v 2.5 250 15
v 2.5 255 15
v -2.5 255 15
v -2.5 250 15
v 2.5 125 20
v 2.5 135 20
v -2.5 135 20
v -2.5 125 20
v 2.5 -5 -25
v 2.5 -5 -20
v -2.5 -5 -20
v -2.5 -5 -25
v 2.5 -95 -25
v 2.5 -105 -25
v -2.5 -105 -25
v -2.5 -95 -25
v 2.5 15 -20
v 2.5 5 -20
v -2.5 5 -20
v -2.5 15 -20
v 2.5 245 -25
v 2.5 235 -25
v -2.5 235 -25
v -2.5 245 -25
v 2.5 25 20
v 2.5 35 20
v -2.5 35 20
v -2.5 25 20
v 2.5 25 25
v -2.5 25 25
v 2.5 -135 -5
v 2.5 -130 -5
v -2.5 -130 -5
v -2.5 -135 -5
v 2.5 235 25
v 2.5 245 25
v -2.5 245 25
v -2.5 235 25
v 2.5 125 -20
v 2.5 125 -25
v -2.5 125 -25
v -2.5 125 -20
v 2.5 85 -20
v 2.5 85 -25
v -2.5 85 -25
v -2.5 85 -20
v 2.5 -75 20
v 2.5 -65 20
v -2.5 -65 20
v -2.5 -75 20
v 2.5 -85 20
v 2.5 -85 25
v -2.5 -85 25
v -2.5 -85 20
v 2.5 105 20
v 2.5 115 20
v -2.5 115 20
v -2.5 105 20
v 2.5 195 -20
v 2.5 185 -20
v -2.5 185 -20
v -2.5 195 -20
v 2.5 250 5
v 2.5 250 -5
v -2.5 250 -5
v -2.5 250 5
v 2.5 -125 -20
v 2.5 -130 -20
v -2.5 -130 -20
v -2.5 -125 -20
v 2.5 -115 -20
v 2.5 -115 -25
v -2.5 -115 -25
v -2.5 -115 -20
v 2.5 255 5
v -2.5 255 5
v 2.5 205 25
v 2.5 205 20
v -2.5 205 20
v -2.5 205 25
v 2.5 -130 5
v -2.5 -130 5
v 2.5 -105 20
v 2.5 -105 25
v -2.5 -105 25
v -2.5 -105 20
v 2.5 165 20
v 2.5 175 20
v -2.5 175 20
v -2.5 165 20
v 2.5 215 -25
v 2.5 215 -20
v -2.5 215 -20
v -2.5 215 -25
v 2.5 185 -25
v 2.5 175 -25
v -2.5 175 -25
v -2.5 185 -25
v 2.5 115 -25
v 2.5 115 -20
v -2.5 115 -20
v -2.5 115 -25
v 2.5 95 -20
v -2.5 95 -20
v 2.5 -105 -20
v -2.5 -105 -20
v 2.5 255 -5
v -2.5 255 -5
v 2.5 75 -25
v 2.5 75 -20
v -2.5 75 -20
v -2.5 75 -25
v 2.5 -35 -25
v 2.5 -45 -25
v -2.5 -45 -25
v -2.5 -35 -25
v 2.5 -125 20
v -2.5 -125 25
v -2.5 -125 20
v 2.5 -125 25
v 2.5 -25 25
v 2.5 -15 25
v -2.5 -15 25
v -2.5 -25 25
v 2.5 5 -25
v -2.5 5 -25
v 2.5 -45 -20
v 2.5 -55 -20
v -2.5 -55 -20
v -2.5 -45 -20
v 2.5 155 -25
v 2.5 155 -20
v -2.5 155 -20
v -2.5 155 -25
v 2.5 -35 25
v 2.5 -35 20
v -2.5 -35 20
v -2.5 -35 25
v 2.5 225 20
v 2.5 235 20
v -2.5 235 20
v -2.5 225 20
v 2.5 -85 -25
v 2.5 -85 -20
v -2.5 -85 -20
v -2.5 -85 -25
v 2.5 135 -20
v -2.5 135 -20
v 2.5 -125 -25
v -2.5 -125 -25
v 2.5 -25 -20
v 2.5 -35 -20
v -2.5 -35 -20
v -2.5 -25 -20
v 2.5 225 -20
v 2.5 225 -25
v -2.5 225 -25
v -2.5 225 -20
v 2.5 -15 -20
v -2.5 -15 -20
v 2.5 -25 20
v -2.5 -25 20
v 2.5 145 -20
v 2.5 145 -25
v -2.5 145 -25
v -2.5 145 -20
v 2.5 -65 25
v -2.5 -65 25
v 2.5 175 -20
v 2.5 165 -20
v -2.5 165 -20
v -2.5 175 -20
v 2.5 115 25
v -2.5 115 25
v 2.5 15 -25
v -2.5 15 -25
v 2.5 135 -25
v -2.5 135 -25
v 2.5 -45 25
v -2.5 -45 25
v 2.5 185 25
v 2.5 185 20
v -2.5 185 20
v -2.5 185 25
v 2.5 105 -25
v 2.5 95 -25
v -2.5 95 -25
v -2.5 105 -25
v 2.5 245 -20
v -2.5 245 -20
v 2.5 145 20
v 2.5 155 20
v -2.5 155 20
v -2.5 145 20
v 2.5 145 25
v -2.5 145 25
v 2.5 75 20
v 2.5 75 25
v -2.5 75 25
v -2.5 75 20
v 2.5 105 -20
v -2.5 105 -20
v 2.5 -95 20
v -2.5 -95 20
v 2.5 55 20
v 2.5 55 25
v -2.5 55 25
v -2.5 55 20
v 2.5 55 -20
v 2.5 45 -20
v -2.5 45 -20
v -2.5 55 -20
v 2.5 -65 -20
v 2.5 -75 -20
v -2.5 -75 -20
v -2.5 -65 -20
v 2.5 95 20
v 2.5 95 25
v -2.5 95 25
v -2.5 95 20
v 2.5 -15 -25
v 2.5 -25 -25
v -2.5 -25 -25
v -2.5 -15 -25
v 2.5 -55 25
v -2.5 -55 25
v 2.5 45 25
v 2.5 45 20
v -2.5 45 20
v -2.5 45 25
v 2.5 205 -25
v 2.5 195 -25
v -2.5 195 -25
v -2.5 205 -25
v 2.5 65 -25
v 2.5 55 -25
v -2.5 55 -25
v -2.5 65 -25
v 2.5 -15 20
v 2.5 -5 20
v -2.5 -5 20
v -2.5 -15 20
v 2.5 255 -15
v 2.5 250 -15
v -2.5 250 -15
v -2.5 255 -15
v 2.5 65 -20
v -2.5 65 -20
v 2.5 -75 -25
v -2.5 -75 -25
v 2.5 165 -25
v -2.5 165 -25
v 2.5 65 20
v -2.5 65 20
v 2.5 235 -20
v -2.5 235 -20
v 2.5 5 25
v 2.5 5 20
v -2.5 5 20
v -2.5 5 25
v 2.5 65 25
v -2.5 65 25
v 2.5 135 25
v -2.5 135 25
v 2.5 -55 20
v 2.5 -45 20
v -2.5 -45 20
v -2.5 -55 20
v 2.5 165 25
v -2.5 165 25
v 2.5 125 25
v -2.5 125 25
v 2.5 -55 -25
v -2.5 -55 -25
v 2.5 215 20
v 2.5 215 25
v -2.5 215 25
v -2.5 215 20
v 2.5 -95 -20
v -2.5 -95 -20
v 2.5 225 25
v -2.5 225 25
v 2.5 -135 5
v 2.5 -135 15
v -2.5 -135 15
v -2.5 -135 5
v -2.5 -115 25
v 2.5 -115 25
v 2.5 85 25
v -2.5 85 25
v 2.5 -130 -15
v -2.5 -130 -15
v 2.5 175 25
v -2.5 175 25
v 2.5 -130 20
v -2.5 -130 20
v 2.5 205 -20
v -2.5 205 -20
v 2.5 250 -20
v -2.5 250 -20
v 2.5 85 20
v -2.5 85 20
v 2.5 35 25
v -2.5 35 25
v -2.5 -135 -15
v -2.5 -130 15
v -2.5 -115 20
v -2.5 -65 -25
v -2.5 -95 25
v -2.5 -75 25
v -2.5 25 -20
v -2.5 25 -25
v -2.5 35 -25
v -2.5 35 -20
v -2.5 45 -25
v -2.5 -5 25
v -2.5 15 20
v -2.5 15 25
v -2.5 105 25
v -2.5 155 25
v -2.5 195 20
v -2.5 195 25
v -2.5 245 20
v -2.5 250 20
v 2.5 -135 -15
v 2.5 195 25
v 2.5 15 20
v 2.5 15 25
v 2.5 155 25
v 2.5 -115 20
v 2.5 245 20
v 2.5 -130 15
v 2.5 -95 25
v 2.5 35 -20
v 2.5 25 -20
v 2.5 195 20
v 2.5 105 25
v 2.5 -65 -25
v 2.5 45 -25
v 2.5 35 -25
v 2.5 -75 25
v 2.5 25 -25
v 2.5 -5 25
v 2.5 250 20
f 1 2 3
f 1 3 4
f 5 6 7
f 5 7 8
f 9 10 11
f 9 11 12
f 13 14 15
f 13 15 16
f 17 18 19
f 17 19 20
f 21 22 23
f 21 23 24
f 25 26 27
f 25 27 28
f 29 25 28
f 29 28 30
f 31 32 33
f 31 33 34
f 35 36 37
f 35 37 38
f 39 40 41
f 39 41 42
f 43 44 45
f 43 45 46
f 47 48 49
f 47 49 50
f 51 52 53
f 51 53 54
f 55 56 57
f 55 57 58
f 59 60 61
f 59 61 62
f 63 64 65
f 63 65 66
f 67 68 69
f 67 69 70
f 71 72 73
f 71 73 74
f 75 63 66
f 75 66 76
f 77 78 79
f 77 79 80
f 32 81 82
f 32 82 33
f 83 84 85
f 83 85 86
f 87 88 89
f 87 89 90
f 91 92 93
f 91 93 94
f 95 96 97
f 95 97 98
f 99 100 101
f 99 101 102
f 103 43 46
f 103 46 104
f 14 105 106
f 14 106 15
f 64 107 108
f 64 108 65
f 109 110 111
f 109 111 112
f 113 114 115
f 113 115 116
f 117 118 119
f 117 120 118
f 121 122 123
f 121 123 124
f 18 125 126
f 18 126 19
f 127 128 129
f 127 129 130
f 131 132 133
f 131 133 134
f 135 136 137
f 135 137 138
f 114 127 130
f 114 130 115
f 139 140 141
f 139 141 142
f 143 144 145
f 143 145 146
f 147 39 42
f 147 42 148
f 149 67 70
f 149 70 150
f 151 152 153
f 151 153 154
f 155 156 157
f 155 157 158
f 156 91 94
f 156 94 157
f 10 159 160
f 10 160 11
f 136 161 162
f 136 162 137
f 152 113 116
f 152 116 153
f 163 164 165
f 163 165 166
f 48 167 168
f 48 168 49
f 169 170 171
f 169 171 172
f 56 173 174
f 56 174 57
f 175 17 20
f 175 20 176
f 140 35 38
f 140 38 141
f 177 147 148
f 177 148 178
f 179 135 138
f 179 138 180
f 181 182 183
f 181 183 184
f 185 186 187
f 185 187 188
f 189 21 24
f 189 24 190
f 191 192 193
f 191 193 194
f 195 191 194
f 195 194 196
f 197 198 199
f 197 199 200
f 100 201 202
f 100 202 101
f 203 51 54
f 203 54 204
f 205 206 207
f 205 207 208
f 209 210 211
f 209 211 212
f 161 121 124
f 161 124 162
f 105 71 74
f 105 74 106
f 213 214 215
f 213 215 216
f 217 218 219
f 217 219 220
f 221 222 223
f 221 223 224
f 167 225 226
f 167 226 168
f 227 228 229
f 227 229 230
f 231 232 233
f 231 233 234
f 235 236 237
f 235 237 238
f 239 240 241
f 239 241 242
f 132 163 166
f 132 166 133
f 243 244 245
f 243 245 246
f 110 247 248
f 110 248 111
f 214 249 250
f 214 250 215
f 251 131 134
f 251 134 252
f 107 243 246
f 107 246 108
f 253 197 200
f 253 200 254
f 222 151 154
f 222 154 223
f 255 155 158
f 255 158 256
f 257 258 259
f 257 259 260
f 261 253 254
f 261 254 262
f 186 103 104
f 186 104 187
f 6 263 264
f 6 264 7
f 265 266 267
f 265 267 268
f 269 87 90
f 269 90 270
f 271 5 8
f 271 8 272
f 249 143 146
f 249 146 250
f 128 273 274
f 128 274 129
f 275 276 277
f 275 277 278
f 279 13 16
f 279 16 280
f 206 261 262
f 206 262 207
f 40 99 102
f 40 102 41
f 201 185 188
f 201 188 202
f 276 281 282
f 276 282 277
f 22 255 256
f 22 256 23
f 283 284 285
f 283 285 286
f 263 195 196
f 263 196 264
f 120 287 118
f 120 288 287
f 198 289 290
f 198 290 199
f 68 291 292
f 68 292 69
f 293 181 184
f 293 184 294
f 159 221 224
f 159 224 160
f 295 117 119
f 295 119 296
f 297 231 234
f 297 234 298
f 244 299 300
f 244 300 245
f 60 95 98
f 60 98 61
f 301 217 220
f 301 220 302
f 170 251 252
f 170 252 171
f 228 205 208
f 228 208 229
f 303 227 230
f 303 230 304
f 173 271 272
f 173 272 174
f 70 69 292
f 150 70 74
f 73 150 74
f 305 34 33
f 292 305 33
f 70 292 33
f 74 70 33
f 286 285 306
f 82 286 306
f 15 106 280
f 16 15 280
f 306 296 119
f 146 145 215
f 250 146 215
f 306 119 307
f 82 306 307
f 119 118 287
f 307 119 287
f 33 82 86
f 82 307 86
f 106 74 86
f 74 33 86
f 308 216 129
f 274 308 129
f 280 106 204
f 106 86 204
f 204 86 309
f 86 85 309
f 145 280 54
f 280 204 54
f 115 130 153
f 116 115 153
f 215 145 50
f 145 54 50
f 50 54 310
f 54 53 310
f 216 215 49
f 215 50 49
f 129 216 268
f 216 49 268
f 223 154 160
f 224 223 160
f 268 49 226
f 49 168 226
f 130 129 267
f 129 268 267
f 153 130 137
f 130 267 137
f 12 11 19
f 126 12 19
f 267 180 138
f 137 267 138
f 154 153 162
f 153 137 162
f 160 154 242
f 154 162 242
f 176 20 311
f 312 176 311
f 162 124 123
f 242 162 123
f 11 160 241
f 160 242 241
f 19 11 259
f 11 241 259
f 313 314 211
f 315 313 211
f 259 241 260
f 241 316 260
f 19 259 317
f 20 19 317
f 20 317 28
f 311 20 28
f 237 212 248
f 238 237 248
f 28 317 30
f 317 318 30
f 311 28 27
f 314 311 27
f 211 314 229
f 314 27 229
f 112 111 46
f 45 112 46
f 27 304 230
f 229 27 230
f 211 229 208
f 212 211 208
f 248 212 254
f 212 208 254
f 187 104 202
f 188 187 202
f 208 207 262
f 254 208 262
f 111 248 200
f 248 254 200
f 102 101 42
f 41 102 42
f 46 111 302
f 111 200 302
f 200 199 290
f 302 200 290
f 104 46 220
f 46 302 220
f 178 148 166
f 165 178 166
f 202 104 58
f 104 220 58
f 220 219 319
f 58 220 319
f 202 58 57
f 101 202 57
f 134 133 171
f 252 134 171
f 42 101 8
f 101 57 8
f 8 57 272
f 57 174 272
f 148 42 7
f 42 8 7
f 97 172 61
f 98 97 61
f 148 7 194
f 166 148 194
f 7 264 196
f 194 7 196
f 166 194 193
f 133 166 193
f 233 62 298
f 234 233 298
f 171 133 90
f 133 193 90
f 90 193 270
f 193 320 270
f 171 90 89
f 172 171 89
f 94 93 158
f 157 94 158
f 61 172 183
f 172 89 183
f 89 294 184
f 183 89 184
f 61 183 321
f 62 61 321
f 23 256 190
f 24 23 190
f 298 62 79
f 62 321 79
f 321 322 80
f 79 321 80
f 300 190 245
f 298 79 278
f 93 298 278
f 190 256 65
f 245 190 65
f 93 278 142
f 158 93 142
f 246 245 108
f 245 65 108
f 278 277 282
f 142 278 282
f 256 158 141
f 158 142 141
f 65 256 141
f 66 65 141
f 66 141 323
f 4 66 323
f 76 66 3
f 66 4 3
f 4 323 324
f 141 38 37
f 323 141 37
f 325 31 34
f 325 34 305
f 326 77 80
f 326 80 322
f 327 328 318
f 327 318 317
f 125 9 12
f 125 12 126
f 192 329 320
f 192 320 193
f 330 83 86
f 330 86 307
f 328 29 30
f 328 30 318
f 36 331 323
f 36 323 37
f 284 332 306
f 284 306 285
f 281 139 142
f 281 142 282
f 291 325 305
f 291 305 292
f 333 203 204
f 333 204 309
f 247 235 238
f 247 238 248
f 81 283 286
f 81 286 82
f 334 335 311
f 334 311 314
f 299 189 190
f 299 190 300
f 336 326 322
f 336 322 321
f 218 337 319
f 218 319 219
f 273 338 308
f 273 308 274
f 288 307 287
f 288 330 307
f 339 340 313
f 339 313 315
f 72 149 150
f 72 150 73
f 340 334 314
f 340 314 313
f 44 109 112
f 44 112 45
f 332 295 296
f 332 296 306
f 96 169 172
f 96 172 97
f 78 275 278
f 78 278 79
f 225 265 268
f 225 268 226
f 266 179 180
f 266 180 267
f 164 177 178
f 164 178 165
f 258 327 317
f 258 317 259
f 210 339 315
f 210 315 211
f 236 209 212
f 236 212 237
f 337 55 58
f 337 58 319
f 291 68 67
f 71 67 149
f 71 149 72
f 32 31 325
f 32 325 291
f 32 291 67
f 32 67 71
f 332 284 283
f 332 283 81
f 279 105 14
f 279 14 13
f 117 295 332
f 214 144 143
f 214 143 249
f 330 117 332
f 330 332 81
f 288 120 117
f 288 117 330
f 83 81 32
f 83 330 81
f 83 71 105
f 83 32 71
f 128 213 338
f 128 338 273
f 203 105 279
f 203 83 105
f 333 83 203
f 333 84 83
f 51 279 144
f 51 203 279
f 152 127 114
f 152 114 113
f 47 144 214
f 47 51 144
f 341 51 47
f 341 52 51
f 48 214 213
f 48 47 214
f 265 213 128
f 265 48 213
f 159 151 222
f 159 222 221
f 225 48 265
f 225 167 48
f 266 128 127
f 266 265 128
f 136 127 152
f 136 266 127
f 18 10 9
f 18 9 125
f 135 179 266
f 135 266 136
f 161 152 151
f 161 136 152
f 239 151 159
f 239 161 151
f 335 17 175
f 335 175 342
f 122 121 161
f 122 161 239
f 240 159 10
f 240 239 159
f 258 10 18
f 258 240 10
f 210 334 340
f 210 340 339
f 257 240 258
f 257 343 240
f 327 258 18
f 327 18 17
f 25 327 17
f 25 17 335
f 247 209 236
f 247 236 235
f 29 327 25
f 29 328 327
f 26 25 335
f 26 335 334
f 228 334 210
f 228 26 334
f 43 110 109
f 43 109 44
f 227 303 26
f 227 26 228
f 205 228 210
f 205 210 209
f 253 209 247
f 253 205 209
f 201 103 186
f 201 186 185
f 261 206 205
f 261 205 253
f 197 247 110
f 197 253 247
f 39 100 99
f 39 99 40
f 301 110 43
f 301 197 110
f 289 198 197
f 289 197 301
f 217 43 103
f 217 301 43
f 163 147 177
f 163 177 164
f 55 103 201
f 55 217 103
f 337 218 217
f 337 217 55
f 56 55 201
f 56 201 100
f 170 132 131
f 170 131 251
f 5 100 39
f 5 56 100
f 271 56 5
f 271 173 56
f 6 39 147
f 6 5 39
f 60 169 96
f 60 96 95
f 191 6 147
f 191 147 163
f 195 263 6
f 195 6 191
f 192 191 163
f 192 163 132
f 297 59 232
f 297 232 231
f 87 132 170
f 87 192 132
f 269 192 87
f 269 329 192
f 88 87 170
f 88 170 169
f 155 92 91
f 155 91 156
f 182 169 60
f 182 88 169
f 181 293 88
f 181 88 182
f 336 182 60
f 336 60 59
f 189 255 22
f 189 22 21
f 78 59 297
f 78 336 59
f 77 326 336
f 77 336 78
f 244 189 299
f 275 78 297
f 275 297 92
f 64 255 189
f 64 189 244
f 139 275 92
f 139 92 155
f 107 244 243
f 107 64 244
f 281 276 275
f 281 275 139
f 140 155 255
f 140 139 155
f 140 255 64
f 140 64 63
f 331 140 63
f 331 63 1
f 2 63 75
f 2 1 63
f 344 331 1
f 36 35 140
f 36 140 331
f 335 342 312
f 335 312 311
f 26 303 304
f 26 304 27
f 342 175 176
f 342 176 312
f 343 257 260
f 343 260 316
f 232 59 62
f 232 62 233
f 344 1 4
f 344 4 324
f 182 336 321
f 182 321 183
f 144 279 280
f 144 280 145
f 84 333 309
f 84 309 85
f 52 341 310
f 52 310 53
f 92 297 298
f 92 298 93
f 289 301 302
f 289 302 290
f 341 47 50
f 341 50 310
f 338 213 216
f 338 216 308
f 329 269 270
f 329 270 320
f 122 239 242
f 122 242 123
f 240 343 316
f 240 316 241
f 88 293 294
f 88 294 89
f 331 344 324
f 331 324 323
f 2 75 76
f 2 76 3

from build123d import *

# Parameters (mm, degrees)
F1_DEPTH = 2.5


with BuildPart() as f1:
    # F0 (on Right) → F1 (new body, symmetric)
    with BuildSketch(Plane.YZ):
        Polygon((-125, 25), (-125, 20), (-130, 20), (-130, 15), (-135, 15), (-135, 5), (-130, 5), (-130, -5), (-135, -5), (-135, -15), (-130, -15), (-130, -20), (-125, -20), (-125, -25), (-115, -25), (-115, -20), (-105, -20), (-105, -25), (-95, -25), (-95, -20), (-85, -20), (-85, -25), (-75, -25), (-75, -20), (-65, -20), (-65, -25), (-55, -25), (-55, -20), (-45, -20), (-45, -25), (-35, -25), (-35, -20), (-25, -20), (-25, -25), (-15, -25), (-15, -20), (-5, -20), (-5, -25), (5, -25), (5, -20), (15, -20), (15, -25), (25, -25), (25, -20), (35, -20), (35, -25), (45, -25), (45, -20), (55, -20), (55, -25), (65, -25), (65, -20), (75, -20), (75, -25), (85, -25), (85, -20), (95, -20), (95, -25), (105, -25), (105, -20), (115, -20), (115, -25), (125, -25), (125, -20), (135, -20), (135, -25), (145, -25), (145, -20), (155, -20), (155, -25), (165, -25), (165, -20), (175, -20), (175, -25), (185, -25), (185, -20), (195, -20), (195, -25), (205, -25), (205, -20), (215, -20), (215, -25), (225, -25), (225, -20), (235, -20), (235, -25), (245, -25), (245, -20), (250, -20), (250, -15), (255, -15), (255, -5), (250, -5), (250, 5), (255, 5), (255, 15), (250, 15), (250, 20), (245, 20), (245, 25), (235, 25), (235, 20), (225, 20), (225, 25), (215, 25), (215, 20), (205, 20), (205, 25), (195, 25), (195, 20), (185, 20), (185, 25), (175, 25), (175, 20), (165, 20), (165, 25), (155, 25), (155, 20), (145, 20), (145, 25), (135, 25), (135, 20), (125, 20), (125, 25), (115, 25), (115, 20), (105, 20), (105, 25), (95, 25), (95, 20), (85, 20), (85, 25), (75, 25), (75, 20), (65, 20), (65, 25), (55, 25), (55, 20), (45, 20), (45, 25), (35, 25), (35, 20), (25, 20), (25, 25), (15, 25), (15, 20), (5, 20), (5, 25), (-5, 25), (-5, 20), (-15, 20), (-15, 25), (-25, 25), (-25, 20), (-35, 20), (-35, 25), (-45, 25), (-45, 20), (-55, 20), (-55, 25), (-65, 25), (-65, 20), (-75, 20), (-75, 25), (-85, 25), (-85, 20), (-95, 20), (-95, 25), (-105, 25), (-105, 20), (-115, 20), (-115, 25), align=None)
    extrude(amount=F1_DEPTH, both=True)


solid = f1.part
